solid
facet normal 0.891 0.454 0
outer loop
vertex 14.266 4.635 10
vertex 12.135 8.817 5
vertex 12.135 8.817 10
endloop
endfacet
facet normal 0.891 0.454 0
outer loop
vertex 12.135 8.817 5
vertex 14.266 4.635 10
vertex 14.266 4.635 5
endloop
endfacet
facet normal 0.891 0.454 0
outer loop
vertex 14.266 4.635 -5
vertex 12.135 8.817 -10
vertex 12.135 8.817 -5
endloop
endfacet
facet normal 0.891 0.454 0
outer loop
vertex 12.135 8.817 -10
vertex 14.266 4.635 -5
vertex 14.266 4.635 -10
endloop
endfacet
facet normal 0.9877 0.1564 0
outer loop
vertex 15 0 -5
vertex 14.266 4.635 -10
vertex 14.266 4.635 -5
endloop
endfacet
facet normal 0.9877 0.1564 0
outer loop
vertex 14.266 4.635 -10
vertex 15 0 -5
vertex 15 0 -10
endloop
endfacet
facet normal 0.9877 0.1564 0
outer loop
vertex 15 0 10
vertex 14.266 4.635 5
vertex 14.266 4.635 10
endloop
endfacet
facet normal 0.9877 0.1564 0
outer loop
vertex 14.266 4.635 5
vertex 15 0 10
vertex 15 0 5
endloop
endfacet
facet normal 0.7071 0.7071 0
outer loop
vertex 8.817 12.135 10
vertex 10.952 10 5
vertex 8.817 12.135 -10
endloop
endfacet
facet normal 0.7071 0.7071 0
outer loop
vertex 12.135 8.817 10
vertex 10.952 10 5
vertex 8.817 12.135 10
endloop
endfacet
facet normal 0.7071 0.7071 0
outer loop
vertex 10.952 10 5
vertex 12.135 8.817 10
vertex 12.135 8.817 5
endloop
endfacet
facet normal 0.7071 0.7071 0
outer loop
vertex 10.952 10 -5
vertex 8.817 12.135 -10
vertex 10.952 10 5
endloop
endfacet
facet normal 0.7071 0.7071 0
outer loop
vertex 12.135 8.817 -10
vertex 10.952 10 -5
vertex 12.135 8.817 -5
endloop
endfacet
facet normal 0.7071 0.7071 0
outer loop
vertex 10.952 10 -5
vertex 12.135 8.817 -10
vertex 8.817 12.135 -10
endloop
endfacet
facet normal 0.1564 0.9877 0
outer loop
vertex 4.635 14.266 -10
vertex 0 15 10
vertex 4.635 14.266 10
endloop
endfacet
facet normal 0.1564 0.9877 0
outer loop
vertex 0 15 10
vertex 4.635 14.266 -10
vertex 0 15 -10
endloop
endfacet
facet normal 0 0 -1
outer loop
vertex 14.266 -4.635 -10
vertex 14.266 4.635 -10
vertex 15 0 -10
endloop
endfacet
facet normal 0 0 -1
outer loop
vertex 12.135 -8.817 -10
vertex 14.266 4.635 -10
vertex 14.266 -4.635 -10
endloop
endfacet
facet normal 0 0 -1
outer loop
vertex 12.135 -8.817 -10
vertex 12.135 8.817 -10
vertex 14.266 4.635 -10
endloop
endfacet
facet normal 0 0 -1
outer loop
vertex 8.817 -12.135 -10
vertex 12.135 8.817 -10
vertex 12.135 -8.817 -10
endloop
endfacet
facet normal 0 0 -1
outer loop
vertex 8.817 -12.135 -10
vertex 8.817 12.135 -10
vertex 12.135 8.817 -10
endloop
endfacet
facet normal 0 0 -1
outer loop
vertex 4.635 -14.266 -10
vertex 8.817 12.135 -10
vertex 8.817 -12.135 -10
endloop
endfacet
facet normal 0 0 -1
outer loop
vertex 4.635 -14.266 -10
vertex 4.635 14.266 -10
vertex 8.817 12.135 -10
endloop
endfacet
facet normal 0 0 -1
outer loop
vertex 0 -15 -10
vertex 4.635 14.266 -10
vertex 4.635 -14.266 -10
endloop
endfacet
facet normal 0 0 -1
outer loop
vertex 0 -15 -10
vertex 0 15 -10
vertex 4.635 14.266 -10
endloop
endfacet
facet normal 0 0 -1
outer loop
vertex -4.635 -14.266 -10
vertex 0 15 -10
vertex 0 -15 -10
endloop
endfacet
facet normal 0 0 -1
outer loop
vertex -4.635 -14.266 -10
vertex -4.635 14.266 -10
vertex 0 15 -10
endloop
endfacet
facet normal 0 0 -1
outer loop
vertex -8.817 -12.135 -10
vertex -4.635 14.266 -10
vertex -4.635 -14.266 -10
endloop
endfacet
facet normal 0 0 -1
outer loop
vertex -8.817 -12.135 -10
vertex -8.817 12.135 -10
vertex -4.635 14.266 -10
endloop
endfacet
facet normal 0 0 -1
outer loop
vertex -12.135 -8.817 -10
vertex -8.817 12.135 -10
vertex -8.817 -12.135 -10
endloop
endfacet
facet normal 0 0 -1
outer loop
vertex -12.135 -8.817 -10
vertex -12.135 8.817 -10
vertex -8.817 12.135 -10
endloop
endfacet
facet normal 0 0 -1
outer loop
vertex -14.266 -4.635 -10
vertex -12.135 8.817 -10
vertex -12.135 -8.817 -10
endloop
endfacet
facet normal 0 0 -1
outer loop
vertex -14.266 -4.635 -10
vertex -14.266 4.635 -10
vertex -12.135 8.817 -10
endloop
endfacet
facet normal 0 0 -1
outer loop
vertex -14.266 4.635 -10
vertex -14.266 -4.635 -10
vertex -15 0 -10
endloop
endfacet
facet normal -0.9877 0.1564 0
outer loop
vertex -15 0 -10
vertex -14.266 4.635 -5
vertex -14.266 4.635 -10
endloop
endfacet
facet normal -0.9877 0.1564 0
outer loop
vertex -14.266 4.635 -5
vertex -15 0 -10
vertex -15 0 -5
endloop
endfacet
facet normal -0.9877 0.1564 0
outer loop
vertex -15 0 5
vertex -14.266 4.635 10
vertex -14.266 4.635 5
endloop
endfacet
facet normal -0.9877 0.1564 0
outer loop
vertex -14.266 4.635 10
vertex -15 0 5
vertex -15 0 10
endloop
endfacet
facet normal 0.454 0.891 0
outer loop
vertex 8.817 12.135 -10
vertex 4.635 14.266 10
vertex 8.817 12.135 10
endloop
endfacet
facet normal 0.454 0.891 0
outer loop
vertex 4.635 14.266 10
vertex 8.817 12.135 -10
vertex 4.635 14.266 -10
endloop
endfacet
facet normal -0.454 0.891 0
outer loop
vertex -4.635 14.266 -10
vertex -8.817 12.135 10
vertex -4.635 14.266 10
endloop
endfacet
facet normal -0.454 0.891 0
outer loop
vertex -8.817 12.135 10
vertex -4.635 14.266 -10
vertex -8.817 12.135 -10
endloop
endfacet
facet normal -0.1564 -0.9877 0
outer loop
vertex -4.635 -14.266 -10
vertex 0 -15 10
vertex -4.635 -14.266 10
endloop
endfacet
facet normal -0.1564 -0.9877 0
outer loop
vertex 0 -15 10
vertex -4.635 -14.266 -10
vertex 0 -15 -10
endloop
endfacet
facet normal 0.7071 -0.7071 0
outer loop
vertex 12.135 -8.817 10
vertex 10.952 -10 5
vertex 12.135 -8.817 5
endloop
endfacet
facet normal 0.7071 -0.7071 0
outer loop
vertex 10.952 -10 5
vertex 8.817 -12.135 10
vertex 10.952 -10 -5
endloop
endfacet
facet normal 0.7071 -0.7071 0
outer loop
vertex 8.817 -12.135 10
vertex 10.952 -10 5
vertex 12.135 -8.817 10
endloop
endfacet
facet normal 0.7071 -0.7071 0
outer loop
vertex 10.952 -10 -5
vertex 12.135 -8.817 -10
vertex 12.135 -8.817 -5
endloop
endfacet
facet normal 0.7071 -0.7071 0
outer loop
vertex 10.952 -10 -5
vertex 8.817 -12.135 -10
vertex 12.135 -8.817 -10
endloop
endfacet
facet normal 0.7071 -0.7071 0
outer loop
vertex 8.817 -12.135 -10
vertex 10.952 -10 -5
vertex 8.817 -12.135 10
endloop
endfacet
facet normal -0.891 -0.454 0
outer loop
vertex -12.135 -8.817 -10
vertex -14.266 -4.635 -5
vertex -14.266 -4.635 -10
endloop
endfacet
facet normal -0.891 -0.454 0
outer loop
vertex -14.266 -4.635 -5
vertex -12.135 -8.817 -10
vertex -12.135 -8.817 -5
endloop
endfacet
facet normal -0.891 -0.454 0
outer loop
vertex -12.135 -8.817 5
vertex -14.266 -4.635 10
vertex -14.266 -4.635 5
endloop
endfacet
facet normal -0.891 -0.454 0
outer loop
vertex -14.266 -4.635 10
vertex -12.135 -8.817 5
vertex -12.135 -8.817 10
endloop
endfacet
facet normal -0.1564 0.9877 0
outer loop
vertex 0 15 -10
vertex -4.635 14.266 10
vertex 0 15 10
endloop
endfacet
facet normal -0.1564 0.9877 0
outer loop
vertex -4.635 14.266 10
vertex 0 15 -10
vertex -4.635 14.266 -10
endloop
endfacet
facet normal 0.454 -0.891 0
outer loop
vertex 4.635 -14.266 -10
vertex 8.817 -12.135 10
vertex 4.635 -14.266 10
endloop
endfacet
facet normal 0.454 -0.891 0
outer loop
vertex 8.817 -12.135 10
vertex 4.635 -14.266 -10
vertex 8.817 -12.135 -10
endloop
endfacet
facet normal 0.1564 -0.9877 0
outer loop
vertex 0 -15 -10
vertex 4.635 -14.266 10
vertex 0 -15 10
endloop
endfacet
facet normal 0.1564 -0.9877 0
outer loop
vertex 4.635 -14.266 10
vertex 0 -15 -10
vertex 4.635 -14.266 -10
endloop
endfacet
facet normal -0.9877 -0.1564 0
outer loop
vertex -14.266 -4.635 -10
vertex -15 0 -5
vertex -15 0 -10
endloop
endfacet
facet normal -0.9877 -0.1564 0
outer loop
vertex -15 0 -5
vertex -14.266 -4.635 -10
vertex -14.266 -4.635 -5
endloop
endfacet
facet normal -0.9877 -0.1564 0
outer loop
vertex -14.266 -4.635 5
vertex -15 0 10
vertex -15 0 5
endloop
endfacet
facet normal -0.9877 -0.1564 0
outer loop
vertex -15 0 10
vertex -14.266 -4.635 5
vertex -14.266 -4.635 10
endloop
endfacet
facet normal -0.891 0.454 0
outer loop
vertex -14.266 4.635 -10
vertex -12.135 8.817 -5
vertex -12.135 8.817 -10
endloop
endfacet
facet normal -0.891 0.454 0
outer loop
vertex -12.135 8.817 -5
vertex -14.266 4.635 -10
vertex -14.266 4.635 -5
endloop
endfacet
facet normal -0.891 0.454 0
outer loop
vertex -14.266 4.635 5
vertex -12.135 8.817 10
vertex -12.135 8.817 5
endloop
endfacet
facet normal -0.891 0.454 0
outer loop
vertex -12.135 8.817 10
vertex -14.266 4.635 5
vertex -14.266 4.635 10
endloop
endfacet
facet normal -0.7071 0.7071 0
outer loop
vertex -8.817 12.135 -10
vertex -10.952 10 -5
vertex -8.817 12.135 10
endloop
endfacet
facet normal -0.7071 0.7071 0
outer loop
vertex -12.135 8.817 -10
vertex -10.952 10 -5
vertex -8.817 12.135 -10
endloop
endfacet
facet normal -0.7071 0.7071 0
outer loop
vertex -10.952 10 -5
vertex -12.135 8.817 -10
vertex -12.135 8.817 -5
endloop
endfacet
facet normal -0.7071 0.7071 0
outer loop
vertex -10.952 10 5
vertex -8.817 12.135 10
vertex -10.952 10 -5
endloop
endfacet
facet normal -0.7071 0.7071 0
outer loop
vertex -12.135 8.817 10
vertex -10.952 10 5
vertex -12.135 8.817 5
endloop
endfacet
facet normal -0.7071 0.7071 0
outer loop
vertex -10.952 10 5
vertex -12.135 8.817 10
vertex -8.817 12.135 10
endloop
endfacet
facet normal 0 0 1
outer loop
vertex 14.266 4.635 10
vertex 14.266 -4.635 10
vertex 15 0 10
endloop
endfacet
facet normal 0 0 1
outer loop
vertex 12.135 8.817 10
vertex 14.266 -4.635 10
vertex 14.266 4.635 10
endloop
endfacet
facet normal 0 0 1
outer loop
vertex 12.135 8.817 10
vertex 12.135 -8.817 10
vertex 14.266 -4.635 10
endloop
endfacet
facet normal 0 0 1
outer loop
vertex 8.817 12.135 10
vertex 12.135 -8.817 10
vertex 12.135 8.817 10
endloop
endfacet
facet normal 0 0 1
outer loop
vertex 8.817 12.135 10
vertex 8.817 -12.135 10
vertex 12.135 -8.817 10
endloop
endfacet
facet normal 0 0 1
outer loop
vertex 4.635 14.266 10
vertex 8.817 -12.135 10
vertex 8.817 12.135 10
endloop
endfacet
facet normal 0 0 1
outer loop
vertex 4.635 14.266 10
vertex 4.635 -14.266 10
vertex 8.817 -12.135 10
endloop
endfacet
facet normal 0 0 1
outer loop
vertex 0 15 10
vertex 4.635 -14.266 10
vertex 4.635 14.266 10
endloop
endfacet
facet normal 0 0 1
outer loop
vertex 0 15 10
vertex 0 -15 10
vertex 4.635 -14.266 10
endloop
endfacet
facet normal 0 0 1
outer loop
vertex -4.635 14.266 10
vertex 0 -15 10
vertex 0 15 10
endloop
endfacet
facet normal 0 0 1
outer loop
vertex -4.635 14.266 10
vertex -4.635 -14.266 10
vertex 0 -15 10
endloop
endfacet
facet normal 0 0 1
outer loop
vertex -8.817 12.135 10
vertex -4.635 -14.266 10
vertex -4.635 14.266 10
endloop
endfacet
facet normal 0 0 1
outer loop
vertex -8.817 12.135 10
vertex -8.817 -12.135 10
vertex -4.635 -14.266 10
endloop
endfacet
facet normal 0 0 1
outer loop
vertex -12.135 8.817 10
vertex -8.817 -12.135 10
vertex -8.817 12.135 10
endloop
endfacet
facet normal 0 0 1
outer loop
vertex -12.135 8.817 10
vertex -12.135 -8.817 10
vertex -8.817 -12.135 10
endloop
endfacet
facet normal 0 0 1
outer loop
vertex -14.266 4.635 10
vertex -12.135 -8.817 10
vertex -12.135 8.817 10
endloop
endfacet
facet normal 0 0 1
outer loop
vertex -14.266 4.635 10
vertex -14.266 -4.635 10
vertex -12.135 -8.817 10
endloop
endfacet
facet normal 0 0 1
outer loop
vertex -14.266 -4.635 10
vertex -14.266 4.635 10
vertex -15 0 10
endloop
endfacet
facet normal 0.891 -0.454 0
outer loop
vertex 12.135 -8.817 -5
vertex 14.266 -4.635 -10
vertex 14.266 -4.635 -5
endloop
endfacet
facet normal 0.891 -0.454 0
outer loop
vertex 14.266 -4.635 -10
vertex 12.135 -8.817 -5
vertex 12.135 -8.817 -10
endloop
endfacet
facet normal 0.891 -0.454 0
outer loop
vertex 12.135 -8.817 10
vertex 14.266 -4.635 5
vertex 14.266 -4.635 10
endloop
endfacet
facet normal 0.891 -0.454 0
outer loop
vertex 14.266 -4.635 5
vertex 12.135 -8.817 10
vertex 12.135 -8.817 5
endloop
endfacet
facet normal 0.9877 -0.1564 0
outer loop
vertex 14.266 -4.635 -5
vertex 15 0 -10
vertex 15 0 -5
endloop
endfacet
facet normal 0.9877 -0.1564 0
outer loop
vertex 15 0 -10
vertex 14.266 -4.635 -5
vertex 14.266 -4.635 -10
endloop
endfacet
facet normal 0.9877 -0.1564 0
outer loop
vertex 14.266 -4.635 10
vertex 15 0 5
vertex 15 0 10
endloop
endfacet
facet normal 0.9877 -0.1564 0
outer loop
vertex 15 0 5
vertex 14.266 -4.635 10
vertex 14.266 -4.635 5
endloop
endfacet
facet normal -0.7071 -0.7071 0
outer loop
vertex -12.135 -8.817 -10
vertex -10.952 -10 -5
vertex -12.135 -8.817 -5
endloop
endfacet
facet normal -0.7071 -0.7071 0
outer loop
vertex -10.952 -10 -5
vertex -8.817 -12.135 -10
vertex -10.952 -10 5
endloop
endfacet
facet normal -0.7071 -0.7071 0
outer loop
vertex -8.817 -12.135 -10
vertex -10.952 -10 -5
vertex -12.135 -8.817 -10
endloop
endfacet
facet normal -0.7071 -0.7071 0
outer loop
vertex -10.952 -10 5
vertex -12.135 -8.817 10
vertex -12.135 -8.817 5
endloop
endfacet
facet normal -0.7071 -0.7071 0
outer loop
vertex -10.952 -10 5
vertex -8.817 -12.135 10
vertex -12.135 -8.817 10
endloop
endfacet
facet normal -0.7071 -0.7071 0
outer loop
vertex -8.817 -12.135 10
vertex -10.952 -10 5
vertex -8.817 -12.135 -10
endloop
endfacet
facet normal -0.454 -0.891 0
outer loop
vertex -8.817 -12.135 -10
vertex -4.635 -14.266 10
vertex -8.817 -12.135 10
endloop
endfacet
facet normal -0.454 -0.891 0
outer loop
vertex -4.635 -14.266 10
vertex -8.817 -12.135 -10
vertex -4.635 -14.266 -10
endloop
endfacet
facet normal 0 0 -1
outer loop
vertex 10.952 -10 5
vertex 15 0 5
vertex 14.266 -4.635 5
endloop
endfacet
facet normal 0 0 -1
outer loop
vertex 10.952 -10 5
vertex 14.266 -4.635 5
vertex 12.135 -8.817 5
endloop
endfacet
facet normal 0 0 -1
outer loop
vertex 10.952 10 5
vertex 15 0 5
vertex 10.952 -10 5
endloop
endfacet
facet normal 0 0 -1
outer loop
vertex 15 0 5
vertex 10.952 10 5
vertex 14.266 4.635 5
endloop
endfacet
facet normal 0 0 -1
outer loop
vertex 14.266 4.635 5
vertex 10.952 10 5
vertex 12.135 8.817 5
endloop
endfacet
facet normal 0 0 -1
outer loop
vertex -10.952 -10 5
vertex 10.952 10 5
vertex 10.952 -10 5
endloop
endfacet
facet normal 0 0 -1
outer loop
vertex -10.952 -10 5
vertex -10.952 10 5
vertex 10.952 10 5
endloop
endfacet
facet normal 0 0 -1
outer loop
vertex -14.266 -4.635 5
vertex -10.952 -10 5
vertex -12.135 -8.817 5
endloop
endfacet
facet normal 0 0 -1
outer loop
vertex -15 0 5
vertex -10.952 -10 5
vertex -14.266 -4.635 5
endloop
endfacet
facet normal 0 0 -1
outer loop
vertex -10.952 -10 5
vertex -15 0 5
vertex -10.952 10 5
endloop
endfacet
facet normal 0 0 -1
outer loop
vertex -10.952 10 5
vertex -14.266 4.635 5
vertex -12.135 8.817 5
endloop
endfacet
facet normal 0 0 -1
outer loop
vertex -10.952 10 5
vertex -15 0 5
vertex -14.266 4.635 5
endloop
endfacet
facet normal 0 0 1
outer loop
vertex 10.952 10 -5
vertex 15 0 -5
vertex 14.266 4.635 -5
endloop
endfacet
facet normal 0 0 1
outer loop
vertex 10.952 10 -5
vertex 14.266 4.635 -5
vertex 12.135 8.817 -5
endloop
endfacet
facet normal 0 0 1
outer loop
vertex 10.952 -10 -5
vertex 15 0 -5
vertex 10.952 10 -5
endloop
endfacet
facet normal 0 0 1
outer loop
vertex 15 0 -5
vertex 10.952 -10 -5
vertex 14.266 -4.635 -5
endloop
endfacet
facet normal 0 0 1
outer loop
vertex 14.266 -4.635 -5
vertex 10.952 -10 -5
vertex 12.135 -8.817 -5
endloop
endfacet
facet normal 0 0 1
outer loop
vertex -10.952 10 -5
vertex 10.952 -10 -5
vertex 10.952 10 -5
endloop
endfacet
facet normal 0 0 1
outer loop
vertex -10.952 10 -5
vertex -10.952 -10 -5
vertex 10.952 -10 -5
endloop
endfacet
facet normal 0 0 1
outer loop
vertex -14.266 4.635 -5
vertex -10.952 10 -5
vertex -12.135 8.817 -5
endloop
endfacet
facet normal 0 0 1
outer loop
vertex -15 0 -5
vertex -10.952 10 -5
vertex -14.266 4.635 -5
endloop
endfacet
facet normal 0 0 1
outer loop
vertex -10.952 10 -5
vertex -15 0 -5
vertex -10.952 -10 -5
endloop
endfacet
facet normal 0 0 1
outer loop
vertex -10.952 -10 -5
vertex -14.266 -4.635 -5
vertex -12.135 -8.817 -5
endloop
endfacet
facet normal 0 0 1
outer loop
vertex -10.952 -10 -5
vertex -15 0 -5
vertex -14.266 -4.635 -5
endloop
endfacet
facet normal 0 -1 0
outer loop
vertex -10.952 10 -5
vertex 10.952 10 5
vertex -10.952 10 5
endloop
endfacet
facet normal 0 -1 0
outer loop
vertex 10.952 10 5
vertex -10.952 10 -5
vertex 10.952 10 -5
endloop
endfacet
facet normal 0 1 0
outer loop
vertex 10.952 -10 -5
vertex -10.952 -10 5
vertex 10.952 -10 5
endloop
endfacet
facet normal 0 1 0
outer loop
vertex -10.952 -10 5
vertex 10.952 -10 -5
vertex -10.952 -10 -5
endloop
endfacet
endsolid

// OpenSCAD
difference()
{
  cylinder(h=20, r=15,
    center=true, $fn=20);
  cube(size=[30,20,10],
    center=true);
}
